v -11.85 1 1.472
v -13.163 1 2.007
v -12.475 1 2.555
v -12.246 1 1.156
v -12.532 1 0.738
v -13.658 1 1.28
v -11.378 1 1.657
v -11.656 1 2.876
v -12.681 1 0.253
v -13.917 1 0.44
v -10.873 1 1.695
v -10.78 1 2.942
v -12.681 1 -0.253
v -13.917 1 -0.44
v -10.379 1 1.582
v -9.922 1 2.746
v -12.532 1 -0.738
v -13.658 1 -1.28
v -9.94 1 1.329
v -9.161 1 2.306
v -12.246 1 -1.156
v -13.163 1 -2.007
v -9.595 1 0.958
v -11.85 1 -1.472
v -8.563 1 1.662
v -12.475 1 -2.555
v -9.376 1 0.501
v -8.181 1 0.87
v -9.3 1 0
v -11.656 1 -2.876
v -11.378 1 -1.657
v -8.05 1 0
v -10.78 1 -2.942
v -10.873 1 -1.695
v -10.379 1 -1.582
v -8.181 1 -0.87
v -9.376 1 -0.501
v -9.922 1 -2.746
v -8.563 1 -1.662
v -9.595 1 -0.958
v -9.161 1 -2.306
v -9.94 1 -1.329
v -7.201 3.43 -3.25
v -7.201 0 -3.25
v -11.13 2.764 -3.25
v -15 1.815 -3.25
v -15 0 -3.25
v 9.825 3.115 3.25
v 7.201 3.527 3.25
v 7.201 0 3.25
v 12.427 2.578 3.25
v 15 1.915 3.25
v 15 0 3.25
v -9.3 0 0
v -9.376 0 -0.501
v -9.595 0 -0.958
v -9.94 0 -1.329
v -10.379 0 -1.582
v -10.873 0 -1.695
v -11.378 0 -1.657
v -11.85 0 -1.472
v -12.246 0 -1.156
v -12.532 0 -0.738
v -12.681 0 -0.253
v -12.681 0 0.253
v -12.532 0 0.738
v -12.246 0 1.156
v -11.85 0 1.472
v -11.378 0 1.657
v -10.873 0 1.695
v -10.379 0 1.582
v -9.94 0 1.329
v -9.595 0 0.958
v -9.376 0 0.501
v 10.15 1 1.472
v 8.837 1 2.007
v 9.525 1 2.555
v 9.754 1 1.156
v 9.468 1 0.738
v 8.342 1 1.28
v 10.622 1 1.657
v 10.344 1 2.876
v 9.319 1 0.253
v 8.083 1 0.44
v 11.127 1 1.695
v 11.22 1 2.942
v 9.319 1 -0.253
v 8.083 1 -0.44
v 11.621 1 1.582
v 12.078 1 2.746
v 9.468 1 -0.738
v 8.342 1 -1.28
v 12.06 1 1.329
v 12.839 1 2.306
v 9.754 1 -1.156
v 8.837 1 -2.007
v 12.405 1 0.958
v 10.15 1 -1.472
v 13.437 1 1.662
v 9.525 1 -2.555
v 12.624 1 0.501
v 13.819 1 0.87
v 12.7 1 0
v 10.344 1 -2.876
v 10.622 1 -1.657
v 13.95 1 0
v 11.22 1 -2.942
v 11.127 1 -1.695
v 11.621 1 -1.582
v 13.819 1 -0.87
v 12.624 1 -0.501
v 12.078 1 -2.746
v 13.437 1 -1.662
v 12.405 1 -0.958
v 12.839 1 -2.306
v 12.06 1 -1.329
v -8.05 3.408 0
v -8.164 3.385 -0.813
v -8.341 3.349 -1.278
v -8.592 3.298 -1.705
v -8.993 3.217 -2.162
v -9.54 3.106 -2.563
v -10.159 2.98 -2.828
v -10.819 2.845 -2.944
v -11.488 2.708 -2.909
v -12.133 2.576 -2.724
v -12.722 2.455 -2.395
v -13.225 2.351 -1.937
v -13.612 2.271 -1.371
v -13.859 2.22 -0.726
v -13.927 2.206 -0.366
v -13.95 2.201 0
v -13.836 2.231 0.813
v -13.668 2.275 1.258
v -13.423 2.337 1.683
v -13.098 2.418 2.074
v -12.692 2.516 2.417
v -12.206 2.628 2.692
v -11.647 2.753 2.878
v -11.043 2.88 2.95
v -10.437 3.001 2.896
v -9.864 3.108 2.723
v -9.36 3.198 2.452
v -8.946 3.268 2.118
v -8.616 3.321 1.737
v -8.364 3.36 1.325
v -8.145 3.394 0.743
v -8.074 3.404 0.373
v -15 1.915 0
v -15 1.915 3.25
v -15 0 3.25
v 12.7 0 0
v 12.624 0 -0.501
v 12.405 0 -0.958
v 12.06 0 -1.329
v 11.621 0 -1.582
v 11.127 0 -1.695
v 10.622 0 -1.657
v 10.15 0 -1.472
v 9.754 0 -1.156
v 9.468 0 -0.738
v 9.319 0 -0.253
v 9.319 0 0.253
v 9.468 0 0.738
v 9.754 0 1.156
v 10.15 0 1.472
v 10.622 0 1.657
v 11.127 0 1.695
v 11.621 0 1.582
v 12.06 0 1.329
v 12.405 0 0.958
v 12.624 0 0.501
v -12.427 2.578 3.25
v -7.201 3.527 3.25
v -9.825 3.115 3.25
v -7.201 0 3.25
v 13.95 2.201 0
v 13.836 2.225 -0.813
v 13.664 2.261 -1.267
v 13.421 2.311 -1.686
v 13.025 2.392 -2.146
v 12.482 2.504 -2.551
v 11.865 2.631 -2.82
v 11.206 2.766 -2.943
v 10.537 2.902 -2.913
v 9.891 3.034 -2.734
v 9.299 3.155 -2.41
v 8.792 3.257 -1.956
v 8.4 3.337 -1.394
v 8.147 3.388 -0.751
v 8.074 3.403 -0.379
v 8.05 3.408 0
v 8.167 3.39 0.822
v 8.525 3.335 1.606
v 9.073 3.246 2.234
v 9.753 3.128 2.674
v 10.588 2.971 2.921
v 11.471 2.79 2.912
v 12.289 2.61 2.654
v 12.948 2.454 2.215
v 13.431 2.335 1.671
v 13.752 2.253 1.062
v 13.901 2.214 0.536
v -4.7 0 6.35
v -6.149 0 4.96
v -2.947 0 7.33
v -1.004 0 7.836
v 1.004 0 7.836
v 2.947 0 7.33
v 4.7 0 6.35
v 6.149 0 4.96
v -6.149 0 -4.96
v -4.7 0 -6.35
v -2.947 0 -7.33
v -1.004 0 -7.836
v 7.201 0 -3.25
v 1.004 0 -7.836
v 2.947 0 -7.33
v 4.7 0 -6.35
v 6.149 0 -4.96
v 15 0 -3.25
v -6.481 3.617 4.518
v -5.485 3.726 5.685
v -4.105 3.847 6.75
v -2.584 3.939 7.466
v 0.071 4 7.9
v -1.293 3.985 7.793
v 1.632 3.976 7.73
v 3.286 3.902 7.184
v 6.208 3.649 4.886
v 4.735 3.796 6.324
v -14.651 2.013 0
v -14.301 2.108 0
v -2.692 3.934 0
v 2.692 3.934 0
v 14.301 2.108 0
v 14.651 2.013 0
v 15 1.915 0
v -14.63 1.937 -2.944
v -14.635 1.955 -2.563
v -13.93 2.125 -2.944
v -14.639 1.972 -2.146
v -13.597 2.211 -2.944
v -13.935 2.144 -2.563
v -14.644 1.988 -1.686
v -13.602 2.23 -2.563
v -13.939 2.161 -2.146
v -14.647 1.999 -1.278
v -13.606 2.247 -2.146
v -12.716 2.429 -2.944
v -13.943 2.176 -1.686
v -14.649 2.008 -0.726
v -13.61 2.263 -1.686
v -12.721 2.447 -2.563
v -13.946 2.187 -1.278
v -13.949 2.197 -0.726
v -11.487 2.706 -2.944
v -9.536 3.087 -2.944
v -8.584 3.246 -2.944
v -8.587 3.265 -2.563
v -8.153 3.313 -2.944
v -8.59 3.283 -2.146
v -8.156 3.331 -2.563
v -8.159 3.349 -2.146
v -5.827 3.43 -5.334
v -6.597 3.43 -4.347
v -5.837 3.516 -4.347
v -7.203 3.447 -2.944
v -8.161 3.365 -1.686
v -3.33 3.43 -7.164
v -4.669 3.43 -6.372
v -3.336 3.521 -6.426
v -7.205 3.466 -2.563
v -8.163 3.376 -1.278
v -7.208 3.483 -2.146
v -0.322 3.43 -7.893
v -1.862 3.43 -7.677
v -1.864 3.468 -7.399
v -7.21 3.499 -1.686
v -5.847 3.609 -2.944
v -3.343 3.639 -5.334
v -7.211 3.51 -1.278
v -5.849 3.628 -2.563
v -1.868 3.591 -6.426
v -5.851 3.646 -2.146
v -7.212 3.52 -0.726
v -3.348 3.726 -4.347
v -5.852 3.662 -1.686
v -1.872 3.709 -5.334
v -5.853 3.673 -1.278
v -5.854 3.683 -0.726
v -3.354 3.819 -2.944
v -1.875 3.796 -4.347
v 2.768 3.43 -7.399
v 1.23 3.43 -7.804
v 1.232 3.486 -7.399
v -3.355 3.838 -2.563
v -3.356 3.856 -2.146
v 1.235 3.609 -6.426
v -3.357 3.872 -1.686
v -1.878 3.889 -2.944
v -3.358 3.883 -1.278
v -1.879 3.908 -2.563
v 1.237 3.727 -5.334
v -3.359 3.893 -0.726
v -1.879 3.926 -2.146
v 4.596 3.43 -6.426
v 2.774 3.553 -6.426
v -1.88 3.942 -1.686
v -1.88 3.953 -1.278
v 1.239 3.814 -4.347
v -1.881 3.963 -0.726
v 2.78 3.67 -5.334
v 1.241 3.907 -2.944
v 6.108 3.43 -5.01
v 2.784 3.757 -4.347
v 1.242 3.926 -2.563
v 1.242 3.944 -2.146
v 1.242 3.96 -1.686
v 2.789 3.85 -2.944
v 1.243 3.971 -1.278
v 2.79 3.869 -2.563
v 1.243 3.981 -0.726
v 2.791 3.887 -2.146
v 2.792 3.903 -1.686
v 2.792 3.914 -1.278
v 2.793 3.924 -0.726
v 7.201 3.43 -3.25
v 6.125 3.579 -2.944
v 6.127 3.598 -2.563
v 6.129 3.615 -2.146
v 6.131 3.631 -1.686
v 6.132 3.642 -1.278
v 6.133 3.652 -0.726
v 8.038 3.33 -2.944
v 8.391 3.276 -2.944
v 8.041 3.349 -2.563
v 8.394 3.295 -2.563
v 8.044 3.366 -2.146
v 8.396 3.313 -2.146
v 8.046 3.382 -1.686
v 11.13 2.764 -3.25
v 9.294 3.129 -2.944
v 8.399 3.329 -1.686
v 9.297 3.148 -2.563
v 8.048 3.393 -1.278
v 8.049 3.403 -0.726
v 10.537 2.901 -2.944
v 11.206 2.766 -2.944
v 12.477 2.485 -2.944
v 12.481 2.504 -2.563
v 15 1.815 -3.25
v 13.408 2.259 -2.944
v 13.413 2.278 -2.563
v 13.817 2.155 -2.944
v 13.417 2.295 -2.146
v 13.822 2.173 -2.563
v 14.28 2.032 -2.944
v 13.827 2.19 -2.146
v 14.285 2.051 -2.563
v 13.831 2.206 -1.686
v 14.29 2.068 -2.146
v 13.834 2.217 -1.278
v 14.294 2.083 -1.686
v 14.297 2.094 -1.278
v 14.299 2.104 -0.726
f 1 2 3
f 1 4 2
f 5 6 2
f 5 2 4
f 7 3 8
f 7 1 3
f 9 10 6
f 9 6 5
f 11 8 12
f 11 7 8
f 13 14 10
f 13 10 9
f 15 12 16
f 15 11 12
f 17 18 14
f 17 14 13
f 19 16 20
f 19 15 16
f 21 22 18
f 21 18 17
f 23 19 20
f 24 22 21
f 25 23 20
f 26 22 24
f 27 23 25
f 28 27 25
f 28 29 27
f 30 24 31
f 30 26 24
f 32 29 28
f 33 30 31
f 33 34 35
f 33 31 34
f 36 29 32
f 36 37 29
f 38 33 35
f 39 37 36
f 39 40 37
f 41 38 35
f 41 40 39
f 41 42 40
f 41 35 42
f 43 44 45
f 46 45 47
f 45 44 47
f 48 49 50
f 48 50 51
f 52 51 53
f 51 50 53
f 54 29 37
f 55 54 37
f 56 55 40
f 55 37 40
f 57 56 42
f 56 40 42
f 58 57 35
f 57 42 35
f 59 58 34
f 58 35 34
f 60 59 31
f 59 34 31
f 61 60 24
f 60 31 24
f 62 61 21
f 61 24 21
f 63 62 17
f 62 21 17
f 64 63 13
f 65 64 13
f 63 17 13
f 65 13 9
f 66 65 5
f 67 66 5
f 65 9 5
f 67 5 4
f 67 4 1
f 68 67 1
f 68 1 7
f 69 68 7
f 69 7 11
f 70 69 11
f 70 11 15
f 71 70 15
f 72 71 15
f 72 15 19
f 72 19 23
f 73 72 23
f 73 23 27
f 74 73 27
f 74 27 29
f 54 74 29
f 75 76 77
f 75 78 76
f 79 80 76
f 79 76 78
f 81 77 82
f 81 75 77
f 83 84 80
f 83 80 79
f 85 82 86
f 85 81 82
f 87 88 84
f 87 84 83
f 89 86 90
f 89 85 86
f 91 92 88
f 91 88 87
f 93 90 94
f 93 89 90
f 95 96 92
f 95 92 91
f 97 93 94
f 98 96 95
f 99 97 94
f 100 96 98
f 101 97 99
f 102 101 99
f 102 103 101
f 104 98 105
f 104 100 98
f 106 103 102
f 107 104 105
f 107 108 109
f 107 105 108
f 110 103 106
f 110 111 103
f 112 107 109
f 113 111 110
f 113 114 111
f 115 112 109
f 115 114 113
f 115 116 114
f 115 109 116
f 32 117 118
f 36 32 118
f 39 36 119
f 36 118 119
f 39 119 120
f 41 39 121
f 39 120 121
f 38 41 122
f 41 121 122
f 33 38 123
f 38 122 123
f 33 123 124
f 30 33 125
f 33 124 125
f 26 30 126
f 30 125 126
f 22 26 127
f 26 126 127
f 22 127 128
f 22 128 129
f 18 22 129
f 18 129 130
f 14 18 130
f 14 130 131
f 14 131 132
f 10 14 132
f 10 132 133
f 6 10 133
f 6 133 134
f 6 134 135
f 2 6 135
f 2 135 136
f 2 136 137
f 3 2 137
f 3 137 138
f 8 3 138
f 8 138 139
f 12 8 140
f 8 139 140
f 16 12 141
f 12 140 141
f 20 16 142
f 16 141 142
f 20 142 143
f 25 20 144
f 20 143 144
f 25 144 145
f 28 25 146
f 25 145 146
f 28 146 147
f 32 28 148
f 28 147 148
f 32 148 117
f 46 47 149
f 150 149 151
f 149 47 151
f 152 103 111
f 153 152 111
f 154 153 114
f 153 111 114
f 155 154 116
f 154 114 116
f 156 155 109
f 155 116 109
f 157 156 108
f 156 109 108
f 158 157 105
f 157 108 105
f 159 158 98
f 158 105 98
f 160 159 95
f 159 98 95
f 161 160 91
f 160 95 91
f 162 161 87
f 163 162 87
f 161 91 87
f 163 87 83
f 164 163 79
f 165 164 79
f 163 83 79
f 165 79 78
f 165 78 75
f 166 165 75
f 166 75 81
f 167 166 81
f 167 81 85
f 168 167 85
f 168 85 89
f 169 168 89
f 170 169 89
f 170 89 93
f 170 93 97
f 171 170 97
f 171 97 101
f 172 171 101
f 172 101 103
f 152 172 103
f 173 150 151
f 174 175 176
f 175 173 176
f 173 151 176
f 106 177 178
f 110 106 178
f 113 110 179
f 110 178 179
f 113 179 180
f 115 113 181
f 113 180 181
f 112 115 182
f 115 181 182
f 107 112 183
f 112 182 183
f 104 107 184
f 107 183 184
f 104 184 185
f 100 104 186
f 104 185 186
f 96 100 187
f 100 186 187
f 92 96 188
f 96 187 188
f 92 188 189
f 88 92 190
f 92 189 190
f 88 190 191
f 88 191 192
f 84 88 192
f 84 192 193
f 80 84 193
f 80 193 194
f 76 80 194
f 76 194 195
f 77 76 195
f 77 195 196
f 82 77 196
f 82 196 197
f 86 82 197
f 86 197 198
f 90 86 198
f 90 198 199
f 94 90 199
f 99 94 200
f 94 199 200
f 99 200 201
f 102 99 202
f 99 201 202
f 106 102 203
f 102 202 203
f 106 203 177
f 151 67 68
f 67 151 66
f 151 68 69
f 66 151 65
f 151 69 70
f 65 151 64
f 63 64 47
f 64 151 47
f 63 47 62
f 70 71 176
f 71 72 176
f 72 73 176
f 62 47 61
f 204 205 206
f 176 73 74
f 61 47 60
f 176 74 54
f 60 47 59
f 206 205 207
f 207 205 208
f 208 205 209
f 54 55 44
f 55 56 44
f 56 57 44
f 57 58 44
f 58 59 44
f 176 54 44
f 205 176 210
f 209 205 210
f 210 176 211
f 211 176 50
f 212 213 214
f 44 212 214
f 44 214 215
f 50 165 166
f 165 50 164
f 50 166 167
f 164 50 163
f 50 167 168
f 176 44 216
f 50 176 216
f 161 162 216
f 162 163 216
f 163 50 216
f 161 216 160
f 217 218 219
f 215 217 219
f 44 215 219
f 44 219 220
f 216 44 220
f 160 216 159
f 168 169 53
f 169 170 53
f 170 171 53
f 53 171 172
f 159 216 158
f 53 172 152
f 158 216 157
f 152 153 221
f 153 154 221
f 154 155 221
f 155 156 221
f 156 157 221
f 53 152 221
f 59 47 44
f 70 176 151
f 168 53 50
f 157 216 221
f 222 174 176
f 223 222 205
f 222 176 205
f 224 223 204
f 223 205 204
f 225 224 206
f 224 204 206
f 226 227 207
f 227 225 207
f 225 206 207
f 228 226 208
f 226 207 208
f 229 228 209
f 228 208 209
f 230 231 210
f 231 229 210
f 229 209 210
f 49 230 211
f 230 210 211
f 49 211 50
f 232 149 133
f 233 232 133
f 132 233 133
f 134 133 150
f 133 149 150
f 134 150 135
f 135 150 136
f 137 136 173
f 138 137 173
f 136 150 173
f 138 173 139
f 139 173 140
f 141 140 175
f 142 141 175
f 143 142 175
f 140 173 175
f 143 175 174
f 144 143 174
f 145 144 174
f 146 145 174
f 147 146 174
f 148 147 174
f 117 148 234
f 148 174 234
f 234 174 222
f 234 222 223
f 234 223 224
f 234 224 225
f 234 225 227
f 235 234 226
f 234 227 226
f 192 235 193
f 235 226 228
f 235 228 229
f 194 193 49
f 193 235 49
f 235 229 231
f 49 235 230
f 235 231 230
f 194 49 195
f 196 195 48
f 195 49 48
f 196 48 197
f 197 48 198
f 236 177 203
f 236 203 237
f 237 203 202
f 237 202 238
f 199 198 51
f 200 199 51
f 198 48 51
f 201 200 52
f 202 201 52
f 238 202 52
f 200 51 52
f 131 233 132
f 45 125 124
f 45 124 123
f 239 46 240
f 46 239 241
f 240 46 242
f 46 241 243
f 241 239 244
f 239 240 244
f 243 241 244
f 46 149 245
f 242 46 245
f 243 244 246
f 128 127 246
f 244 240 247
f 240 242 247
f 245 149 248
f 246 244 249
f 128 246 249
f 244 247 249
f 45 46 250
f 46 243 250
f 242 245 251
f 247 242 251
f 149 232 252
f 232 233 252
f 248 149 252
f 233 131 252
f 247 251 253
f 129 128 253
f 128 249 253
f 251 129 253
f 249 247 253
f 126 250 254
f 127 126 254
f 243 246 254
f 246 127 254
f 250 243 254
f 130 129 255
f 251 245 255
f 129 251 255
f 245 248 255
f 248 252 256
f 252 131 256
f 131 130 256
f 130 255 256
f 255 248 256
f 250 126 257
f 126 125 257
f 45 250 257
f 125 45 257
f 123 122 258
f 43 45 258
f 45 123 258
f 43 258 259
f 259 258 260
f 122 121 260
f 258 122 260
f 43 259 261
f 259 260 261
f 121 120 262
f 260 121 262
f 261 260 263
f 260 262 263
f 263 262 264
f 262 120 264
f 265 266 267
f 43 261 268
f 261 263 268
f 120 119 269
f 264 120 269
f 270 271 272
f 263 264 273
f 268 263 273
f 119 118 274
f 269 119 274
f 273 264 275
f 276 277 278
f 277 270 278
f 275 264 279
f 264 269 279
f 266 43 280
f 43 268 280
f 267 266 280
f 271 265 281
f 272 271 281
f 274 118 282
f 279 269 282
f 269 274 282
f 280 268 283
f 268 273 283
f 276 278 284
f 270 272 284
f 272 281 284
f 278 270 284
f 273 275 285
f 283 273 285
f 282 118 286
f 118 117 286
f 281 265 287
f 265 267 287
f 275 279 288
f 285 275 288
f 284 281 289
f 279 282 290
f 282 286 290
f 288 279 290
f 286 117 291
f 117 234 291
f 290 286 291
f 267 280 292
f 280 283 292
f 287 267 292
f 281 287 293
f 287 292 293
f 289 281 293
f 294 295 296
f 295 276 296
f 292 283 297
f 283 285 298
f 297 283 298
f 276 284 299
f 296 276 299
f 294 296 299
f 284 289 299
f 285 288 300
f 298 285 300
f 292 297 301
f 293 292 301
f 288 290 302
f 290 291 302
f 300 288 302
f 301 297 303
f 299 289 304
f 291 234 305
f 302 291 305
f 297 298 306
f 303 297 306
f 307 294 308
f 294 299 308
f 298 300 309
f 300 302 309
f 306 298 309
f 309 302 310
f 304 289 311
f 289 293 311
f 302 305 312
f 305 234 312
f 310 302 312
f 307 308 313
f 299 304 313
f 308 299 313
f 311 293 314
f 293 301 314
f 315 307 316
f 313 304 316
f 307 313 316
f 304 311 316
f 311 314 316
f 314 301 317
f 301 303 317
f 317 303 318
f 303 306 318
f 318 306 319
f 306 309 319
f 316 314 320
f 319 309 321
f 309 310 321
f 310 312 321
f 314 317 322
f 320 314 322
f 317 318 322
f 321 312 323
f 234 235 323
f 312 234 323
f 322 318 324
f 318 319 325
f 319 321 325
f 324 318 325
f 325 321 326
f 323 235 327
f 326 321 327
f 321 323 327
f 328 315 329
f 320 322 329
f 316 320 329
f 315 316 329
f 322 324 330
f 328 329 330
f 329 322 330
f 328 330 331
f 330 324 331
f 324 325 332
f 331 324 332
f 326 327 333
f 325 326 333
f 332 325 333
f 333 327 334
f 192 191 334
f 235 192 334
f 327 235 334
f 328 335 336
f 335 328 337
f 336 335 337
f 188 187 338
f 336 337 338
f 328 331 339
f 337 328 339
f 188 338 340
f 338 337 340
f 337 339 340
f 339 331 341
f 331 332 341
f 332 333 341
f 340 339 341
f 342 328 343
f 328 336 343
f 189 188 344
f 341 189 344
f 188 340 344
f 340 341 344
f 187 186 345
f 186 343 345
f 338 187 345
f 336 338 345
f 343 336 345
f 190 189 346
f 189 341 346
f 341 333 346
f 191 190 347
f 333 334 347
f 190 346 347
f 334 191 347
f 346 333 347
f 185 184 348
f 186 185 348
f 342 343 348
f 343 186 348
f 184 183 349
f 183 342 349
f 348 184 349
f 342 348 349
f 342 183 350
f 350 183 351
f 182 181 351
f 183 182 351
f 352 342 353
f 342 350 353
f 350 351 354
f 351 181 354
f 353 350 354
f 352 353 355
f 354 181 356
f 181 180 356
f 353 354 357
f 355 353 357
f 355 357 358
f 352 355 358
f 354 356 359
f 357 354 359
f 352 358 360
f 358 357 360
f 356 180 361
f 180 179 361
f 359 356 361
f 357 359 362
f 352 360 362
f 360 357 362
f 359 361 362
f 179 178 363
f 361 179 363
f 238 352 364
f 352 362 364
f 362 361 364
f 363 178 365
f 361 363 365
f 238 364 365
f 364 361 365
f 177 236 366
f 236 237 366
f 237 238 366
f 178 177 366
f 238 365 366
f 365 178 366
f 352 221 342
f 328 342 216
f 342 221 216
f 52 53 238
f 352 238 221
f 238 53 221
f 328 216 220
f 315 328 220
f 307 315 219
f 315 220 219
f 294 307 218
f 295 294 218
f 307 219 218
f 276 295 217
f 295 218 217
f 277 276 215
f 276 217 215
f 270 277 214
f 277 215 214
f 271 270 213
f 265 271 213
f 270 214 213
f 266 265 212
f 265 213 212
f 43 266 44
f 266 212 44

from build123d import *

# Parameters (mm, degrees)
SALIENTE_EXTRUIR1_DEPTH = 4
CROQUIS2_R              = 1.7
CORTAR_EXTRUIR1_DEPTH   = 4
CROQUIS3_R              = 2.95
CORTAR_EXTRUIR2_DEPTH   = 3


with BuildPart() as part:
    # Croquis1 → Saliente-Extruir1 (new body)
    with BuildSketch(Plane(origin=(0, 0, 0), x_dir=(1, 0, 0), z_dir=(0, 1, 0))):
        with BuildLine():
            Line((-7.200520814, 3.25), (-15, 3.25))
            Line((-15, 3.25), (-15, -3.25))
            Line((-15, -3.25), (-7.200520814, -3.25))
            ThreePointArc((-7.200520814, -3.25), (0, -7.9), (7.200520814, -3.25))
            Line((7.200520814, -3.25), (15, -3.25))
            Line((15, -3.25), (15, 3.25))
            Line((15, 3.25), (7.200520814, 3.25))
            ThreePointArc((7.200520814, 3.25), (0, 7.9), (-7.200520814, 3.25))
        make_face()
    extrude(amount=SALIENTE_EXTRUIR1_DEPTH)

    # Croquis2 → Cortar-Extruir1 (cut)
    with BuildSketch(Plane(origin=(0, 4, 0), x_dir=(1, 0, 0), z_dir=(0, 1, 0))):
        with Locations((-11, 0)):
            Circle(CROQUIS2_R)
        with Locations((11, 0)):
            Circle(CROQUIS2_R)
    extrude(amount=-CORTAR_EXTRUIR1_DEPTH, mode=Mode.SUBTRACT)

    # Croquis3 → Cortar-Extruir2 (cut)
    with BuildSketch(Plane(origin=(0, 4, 0), x_dir=(1, 0, 0), z_dir=(0, 1, 0))):
        with Locations((-11, 0)):
            Circle(CROQUIS3_R)
        with Locations((11, 0)):
            Circle(CROQUIS3_R)
    extrude(amount=-CORTAR_EXTRUIR2_DEPTH, mode=Mode.SUBTRACT)

    # Croquis4 → Cortar-Revolución1 (revolve, cut)
    with BuildSketch(Plane(origin=(0, 0, 0), x_dir=(0, 0, -1), z_dir=(1, 0, 0))):
        with BuildLine():
            Line((0, 4), (-10, 4))
            Line((-10, 4), (-10, 7))
            Line((-10, 7), (10, 7))
            Line((10, 7), (10, 3.083269132))
            ThreePointArc((10, 3.083269132), (5.02096593, 3.770337785), (0, 4))
        make_face()
    revolve(axis=Axis((0, -51, 21.725989645), (0, 0, -1)), mode=Mode.SUBTRACT)


solid = part.part
